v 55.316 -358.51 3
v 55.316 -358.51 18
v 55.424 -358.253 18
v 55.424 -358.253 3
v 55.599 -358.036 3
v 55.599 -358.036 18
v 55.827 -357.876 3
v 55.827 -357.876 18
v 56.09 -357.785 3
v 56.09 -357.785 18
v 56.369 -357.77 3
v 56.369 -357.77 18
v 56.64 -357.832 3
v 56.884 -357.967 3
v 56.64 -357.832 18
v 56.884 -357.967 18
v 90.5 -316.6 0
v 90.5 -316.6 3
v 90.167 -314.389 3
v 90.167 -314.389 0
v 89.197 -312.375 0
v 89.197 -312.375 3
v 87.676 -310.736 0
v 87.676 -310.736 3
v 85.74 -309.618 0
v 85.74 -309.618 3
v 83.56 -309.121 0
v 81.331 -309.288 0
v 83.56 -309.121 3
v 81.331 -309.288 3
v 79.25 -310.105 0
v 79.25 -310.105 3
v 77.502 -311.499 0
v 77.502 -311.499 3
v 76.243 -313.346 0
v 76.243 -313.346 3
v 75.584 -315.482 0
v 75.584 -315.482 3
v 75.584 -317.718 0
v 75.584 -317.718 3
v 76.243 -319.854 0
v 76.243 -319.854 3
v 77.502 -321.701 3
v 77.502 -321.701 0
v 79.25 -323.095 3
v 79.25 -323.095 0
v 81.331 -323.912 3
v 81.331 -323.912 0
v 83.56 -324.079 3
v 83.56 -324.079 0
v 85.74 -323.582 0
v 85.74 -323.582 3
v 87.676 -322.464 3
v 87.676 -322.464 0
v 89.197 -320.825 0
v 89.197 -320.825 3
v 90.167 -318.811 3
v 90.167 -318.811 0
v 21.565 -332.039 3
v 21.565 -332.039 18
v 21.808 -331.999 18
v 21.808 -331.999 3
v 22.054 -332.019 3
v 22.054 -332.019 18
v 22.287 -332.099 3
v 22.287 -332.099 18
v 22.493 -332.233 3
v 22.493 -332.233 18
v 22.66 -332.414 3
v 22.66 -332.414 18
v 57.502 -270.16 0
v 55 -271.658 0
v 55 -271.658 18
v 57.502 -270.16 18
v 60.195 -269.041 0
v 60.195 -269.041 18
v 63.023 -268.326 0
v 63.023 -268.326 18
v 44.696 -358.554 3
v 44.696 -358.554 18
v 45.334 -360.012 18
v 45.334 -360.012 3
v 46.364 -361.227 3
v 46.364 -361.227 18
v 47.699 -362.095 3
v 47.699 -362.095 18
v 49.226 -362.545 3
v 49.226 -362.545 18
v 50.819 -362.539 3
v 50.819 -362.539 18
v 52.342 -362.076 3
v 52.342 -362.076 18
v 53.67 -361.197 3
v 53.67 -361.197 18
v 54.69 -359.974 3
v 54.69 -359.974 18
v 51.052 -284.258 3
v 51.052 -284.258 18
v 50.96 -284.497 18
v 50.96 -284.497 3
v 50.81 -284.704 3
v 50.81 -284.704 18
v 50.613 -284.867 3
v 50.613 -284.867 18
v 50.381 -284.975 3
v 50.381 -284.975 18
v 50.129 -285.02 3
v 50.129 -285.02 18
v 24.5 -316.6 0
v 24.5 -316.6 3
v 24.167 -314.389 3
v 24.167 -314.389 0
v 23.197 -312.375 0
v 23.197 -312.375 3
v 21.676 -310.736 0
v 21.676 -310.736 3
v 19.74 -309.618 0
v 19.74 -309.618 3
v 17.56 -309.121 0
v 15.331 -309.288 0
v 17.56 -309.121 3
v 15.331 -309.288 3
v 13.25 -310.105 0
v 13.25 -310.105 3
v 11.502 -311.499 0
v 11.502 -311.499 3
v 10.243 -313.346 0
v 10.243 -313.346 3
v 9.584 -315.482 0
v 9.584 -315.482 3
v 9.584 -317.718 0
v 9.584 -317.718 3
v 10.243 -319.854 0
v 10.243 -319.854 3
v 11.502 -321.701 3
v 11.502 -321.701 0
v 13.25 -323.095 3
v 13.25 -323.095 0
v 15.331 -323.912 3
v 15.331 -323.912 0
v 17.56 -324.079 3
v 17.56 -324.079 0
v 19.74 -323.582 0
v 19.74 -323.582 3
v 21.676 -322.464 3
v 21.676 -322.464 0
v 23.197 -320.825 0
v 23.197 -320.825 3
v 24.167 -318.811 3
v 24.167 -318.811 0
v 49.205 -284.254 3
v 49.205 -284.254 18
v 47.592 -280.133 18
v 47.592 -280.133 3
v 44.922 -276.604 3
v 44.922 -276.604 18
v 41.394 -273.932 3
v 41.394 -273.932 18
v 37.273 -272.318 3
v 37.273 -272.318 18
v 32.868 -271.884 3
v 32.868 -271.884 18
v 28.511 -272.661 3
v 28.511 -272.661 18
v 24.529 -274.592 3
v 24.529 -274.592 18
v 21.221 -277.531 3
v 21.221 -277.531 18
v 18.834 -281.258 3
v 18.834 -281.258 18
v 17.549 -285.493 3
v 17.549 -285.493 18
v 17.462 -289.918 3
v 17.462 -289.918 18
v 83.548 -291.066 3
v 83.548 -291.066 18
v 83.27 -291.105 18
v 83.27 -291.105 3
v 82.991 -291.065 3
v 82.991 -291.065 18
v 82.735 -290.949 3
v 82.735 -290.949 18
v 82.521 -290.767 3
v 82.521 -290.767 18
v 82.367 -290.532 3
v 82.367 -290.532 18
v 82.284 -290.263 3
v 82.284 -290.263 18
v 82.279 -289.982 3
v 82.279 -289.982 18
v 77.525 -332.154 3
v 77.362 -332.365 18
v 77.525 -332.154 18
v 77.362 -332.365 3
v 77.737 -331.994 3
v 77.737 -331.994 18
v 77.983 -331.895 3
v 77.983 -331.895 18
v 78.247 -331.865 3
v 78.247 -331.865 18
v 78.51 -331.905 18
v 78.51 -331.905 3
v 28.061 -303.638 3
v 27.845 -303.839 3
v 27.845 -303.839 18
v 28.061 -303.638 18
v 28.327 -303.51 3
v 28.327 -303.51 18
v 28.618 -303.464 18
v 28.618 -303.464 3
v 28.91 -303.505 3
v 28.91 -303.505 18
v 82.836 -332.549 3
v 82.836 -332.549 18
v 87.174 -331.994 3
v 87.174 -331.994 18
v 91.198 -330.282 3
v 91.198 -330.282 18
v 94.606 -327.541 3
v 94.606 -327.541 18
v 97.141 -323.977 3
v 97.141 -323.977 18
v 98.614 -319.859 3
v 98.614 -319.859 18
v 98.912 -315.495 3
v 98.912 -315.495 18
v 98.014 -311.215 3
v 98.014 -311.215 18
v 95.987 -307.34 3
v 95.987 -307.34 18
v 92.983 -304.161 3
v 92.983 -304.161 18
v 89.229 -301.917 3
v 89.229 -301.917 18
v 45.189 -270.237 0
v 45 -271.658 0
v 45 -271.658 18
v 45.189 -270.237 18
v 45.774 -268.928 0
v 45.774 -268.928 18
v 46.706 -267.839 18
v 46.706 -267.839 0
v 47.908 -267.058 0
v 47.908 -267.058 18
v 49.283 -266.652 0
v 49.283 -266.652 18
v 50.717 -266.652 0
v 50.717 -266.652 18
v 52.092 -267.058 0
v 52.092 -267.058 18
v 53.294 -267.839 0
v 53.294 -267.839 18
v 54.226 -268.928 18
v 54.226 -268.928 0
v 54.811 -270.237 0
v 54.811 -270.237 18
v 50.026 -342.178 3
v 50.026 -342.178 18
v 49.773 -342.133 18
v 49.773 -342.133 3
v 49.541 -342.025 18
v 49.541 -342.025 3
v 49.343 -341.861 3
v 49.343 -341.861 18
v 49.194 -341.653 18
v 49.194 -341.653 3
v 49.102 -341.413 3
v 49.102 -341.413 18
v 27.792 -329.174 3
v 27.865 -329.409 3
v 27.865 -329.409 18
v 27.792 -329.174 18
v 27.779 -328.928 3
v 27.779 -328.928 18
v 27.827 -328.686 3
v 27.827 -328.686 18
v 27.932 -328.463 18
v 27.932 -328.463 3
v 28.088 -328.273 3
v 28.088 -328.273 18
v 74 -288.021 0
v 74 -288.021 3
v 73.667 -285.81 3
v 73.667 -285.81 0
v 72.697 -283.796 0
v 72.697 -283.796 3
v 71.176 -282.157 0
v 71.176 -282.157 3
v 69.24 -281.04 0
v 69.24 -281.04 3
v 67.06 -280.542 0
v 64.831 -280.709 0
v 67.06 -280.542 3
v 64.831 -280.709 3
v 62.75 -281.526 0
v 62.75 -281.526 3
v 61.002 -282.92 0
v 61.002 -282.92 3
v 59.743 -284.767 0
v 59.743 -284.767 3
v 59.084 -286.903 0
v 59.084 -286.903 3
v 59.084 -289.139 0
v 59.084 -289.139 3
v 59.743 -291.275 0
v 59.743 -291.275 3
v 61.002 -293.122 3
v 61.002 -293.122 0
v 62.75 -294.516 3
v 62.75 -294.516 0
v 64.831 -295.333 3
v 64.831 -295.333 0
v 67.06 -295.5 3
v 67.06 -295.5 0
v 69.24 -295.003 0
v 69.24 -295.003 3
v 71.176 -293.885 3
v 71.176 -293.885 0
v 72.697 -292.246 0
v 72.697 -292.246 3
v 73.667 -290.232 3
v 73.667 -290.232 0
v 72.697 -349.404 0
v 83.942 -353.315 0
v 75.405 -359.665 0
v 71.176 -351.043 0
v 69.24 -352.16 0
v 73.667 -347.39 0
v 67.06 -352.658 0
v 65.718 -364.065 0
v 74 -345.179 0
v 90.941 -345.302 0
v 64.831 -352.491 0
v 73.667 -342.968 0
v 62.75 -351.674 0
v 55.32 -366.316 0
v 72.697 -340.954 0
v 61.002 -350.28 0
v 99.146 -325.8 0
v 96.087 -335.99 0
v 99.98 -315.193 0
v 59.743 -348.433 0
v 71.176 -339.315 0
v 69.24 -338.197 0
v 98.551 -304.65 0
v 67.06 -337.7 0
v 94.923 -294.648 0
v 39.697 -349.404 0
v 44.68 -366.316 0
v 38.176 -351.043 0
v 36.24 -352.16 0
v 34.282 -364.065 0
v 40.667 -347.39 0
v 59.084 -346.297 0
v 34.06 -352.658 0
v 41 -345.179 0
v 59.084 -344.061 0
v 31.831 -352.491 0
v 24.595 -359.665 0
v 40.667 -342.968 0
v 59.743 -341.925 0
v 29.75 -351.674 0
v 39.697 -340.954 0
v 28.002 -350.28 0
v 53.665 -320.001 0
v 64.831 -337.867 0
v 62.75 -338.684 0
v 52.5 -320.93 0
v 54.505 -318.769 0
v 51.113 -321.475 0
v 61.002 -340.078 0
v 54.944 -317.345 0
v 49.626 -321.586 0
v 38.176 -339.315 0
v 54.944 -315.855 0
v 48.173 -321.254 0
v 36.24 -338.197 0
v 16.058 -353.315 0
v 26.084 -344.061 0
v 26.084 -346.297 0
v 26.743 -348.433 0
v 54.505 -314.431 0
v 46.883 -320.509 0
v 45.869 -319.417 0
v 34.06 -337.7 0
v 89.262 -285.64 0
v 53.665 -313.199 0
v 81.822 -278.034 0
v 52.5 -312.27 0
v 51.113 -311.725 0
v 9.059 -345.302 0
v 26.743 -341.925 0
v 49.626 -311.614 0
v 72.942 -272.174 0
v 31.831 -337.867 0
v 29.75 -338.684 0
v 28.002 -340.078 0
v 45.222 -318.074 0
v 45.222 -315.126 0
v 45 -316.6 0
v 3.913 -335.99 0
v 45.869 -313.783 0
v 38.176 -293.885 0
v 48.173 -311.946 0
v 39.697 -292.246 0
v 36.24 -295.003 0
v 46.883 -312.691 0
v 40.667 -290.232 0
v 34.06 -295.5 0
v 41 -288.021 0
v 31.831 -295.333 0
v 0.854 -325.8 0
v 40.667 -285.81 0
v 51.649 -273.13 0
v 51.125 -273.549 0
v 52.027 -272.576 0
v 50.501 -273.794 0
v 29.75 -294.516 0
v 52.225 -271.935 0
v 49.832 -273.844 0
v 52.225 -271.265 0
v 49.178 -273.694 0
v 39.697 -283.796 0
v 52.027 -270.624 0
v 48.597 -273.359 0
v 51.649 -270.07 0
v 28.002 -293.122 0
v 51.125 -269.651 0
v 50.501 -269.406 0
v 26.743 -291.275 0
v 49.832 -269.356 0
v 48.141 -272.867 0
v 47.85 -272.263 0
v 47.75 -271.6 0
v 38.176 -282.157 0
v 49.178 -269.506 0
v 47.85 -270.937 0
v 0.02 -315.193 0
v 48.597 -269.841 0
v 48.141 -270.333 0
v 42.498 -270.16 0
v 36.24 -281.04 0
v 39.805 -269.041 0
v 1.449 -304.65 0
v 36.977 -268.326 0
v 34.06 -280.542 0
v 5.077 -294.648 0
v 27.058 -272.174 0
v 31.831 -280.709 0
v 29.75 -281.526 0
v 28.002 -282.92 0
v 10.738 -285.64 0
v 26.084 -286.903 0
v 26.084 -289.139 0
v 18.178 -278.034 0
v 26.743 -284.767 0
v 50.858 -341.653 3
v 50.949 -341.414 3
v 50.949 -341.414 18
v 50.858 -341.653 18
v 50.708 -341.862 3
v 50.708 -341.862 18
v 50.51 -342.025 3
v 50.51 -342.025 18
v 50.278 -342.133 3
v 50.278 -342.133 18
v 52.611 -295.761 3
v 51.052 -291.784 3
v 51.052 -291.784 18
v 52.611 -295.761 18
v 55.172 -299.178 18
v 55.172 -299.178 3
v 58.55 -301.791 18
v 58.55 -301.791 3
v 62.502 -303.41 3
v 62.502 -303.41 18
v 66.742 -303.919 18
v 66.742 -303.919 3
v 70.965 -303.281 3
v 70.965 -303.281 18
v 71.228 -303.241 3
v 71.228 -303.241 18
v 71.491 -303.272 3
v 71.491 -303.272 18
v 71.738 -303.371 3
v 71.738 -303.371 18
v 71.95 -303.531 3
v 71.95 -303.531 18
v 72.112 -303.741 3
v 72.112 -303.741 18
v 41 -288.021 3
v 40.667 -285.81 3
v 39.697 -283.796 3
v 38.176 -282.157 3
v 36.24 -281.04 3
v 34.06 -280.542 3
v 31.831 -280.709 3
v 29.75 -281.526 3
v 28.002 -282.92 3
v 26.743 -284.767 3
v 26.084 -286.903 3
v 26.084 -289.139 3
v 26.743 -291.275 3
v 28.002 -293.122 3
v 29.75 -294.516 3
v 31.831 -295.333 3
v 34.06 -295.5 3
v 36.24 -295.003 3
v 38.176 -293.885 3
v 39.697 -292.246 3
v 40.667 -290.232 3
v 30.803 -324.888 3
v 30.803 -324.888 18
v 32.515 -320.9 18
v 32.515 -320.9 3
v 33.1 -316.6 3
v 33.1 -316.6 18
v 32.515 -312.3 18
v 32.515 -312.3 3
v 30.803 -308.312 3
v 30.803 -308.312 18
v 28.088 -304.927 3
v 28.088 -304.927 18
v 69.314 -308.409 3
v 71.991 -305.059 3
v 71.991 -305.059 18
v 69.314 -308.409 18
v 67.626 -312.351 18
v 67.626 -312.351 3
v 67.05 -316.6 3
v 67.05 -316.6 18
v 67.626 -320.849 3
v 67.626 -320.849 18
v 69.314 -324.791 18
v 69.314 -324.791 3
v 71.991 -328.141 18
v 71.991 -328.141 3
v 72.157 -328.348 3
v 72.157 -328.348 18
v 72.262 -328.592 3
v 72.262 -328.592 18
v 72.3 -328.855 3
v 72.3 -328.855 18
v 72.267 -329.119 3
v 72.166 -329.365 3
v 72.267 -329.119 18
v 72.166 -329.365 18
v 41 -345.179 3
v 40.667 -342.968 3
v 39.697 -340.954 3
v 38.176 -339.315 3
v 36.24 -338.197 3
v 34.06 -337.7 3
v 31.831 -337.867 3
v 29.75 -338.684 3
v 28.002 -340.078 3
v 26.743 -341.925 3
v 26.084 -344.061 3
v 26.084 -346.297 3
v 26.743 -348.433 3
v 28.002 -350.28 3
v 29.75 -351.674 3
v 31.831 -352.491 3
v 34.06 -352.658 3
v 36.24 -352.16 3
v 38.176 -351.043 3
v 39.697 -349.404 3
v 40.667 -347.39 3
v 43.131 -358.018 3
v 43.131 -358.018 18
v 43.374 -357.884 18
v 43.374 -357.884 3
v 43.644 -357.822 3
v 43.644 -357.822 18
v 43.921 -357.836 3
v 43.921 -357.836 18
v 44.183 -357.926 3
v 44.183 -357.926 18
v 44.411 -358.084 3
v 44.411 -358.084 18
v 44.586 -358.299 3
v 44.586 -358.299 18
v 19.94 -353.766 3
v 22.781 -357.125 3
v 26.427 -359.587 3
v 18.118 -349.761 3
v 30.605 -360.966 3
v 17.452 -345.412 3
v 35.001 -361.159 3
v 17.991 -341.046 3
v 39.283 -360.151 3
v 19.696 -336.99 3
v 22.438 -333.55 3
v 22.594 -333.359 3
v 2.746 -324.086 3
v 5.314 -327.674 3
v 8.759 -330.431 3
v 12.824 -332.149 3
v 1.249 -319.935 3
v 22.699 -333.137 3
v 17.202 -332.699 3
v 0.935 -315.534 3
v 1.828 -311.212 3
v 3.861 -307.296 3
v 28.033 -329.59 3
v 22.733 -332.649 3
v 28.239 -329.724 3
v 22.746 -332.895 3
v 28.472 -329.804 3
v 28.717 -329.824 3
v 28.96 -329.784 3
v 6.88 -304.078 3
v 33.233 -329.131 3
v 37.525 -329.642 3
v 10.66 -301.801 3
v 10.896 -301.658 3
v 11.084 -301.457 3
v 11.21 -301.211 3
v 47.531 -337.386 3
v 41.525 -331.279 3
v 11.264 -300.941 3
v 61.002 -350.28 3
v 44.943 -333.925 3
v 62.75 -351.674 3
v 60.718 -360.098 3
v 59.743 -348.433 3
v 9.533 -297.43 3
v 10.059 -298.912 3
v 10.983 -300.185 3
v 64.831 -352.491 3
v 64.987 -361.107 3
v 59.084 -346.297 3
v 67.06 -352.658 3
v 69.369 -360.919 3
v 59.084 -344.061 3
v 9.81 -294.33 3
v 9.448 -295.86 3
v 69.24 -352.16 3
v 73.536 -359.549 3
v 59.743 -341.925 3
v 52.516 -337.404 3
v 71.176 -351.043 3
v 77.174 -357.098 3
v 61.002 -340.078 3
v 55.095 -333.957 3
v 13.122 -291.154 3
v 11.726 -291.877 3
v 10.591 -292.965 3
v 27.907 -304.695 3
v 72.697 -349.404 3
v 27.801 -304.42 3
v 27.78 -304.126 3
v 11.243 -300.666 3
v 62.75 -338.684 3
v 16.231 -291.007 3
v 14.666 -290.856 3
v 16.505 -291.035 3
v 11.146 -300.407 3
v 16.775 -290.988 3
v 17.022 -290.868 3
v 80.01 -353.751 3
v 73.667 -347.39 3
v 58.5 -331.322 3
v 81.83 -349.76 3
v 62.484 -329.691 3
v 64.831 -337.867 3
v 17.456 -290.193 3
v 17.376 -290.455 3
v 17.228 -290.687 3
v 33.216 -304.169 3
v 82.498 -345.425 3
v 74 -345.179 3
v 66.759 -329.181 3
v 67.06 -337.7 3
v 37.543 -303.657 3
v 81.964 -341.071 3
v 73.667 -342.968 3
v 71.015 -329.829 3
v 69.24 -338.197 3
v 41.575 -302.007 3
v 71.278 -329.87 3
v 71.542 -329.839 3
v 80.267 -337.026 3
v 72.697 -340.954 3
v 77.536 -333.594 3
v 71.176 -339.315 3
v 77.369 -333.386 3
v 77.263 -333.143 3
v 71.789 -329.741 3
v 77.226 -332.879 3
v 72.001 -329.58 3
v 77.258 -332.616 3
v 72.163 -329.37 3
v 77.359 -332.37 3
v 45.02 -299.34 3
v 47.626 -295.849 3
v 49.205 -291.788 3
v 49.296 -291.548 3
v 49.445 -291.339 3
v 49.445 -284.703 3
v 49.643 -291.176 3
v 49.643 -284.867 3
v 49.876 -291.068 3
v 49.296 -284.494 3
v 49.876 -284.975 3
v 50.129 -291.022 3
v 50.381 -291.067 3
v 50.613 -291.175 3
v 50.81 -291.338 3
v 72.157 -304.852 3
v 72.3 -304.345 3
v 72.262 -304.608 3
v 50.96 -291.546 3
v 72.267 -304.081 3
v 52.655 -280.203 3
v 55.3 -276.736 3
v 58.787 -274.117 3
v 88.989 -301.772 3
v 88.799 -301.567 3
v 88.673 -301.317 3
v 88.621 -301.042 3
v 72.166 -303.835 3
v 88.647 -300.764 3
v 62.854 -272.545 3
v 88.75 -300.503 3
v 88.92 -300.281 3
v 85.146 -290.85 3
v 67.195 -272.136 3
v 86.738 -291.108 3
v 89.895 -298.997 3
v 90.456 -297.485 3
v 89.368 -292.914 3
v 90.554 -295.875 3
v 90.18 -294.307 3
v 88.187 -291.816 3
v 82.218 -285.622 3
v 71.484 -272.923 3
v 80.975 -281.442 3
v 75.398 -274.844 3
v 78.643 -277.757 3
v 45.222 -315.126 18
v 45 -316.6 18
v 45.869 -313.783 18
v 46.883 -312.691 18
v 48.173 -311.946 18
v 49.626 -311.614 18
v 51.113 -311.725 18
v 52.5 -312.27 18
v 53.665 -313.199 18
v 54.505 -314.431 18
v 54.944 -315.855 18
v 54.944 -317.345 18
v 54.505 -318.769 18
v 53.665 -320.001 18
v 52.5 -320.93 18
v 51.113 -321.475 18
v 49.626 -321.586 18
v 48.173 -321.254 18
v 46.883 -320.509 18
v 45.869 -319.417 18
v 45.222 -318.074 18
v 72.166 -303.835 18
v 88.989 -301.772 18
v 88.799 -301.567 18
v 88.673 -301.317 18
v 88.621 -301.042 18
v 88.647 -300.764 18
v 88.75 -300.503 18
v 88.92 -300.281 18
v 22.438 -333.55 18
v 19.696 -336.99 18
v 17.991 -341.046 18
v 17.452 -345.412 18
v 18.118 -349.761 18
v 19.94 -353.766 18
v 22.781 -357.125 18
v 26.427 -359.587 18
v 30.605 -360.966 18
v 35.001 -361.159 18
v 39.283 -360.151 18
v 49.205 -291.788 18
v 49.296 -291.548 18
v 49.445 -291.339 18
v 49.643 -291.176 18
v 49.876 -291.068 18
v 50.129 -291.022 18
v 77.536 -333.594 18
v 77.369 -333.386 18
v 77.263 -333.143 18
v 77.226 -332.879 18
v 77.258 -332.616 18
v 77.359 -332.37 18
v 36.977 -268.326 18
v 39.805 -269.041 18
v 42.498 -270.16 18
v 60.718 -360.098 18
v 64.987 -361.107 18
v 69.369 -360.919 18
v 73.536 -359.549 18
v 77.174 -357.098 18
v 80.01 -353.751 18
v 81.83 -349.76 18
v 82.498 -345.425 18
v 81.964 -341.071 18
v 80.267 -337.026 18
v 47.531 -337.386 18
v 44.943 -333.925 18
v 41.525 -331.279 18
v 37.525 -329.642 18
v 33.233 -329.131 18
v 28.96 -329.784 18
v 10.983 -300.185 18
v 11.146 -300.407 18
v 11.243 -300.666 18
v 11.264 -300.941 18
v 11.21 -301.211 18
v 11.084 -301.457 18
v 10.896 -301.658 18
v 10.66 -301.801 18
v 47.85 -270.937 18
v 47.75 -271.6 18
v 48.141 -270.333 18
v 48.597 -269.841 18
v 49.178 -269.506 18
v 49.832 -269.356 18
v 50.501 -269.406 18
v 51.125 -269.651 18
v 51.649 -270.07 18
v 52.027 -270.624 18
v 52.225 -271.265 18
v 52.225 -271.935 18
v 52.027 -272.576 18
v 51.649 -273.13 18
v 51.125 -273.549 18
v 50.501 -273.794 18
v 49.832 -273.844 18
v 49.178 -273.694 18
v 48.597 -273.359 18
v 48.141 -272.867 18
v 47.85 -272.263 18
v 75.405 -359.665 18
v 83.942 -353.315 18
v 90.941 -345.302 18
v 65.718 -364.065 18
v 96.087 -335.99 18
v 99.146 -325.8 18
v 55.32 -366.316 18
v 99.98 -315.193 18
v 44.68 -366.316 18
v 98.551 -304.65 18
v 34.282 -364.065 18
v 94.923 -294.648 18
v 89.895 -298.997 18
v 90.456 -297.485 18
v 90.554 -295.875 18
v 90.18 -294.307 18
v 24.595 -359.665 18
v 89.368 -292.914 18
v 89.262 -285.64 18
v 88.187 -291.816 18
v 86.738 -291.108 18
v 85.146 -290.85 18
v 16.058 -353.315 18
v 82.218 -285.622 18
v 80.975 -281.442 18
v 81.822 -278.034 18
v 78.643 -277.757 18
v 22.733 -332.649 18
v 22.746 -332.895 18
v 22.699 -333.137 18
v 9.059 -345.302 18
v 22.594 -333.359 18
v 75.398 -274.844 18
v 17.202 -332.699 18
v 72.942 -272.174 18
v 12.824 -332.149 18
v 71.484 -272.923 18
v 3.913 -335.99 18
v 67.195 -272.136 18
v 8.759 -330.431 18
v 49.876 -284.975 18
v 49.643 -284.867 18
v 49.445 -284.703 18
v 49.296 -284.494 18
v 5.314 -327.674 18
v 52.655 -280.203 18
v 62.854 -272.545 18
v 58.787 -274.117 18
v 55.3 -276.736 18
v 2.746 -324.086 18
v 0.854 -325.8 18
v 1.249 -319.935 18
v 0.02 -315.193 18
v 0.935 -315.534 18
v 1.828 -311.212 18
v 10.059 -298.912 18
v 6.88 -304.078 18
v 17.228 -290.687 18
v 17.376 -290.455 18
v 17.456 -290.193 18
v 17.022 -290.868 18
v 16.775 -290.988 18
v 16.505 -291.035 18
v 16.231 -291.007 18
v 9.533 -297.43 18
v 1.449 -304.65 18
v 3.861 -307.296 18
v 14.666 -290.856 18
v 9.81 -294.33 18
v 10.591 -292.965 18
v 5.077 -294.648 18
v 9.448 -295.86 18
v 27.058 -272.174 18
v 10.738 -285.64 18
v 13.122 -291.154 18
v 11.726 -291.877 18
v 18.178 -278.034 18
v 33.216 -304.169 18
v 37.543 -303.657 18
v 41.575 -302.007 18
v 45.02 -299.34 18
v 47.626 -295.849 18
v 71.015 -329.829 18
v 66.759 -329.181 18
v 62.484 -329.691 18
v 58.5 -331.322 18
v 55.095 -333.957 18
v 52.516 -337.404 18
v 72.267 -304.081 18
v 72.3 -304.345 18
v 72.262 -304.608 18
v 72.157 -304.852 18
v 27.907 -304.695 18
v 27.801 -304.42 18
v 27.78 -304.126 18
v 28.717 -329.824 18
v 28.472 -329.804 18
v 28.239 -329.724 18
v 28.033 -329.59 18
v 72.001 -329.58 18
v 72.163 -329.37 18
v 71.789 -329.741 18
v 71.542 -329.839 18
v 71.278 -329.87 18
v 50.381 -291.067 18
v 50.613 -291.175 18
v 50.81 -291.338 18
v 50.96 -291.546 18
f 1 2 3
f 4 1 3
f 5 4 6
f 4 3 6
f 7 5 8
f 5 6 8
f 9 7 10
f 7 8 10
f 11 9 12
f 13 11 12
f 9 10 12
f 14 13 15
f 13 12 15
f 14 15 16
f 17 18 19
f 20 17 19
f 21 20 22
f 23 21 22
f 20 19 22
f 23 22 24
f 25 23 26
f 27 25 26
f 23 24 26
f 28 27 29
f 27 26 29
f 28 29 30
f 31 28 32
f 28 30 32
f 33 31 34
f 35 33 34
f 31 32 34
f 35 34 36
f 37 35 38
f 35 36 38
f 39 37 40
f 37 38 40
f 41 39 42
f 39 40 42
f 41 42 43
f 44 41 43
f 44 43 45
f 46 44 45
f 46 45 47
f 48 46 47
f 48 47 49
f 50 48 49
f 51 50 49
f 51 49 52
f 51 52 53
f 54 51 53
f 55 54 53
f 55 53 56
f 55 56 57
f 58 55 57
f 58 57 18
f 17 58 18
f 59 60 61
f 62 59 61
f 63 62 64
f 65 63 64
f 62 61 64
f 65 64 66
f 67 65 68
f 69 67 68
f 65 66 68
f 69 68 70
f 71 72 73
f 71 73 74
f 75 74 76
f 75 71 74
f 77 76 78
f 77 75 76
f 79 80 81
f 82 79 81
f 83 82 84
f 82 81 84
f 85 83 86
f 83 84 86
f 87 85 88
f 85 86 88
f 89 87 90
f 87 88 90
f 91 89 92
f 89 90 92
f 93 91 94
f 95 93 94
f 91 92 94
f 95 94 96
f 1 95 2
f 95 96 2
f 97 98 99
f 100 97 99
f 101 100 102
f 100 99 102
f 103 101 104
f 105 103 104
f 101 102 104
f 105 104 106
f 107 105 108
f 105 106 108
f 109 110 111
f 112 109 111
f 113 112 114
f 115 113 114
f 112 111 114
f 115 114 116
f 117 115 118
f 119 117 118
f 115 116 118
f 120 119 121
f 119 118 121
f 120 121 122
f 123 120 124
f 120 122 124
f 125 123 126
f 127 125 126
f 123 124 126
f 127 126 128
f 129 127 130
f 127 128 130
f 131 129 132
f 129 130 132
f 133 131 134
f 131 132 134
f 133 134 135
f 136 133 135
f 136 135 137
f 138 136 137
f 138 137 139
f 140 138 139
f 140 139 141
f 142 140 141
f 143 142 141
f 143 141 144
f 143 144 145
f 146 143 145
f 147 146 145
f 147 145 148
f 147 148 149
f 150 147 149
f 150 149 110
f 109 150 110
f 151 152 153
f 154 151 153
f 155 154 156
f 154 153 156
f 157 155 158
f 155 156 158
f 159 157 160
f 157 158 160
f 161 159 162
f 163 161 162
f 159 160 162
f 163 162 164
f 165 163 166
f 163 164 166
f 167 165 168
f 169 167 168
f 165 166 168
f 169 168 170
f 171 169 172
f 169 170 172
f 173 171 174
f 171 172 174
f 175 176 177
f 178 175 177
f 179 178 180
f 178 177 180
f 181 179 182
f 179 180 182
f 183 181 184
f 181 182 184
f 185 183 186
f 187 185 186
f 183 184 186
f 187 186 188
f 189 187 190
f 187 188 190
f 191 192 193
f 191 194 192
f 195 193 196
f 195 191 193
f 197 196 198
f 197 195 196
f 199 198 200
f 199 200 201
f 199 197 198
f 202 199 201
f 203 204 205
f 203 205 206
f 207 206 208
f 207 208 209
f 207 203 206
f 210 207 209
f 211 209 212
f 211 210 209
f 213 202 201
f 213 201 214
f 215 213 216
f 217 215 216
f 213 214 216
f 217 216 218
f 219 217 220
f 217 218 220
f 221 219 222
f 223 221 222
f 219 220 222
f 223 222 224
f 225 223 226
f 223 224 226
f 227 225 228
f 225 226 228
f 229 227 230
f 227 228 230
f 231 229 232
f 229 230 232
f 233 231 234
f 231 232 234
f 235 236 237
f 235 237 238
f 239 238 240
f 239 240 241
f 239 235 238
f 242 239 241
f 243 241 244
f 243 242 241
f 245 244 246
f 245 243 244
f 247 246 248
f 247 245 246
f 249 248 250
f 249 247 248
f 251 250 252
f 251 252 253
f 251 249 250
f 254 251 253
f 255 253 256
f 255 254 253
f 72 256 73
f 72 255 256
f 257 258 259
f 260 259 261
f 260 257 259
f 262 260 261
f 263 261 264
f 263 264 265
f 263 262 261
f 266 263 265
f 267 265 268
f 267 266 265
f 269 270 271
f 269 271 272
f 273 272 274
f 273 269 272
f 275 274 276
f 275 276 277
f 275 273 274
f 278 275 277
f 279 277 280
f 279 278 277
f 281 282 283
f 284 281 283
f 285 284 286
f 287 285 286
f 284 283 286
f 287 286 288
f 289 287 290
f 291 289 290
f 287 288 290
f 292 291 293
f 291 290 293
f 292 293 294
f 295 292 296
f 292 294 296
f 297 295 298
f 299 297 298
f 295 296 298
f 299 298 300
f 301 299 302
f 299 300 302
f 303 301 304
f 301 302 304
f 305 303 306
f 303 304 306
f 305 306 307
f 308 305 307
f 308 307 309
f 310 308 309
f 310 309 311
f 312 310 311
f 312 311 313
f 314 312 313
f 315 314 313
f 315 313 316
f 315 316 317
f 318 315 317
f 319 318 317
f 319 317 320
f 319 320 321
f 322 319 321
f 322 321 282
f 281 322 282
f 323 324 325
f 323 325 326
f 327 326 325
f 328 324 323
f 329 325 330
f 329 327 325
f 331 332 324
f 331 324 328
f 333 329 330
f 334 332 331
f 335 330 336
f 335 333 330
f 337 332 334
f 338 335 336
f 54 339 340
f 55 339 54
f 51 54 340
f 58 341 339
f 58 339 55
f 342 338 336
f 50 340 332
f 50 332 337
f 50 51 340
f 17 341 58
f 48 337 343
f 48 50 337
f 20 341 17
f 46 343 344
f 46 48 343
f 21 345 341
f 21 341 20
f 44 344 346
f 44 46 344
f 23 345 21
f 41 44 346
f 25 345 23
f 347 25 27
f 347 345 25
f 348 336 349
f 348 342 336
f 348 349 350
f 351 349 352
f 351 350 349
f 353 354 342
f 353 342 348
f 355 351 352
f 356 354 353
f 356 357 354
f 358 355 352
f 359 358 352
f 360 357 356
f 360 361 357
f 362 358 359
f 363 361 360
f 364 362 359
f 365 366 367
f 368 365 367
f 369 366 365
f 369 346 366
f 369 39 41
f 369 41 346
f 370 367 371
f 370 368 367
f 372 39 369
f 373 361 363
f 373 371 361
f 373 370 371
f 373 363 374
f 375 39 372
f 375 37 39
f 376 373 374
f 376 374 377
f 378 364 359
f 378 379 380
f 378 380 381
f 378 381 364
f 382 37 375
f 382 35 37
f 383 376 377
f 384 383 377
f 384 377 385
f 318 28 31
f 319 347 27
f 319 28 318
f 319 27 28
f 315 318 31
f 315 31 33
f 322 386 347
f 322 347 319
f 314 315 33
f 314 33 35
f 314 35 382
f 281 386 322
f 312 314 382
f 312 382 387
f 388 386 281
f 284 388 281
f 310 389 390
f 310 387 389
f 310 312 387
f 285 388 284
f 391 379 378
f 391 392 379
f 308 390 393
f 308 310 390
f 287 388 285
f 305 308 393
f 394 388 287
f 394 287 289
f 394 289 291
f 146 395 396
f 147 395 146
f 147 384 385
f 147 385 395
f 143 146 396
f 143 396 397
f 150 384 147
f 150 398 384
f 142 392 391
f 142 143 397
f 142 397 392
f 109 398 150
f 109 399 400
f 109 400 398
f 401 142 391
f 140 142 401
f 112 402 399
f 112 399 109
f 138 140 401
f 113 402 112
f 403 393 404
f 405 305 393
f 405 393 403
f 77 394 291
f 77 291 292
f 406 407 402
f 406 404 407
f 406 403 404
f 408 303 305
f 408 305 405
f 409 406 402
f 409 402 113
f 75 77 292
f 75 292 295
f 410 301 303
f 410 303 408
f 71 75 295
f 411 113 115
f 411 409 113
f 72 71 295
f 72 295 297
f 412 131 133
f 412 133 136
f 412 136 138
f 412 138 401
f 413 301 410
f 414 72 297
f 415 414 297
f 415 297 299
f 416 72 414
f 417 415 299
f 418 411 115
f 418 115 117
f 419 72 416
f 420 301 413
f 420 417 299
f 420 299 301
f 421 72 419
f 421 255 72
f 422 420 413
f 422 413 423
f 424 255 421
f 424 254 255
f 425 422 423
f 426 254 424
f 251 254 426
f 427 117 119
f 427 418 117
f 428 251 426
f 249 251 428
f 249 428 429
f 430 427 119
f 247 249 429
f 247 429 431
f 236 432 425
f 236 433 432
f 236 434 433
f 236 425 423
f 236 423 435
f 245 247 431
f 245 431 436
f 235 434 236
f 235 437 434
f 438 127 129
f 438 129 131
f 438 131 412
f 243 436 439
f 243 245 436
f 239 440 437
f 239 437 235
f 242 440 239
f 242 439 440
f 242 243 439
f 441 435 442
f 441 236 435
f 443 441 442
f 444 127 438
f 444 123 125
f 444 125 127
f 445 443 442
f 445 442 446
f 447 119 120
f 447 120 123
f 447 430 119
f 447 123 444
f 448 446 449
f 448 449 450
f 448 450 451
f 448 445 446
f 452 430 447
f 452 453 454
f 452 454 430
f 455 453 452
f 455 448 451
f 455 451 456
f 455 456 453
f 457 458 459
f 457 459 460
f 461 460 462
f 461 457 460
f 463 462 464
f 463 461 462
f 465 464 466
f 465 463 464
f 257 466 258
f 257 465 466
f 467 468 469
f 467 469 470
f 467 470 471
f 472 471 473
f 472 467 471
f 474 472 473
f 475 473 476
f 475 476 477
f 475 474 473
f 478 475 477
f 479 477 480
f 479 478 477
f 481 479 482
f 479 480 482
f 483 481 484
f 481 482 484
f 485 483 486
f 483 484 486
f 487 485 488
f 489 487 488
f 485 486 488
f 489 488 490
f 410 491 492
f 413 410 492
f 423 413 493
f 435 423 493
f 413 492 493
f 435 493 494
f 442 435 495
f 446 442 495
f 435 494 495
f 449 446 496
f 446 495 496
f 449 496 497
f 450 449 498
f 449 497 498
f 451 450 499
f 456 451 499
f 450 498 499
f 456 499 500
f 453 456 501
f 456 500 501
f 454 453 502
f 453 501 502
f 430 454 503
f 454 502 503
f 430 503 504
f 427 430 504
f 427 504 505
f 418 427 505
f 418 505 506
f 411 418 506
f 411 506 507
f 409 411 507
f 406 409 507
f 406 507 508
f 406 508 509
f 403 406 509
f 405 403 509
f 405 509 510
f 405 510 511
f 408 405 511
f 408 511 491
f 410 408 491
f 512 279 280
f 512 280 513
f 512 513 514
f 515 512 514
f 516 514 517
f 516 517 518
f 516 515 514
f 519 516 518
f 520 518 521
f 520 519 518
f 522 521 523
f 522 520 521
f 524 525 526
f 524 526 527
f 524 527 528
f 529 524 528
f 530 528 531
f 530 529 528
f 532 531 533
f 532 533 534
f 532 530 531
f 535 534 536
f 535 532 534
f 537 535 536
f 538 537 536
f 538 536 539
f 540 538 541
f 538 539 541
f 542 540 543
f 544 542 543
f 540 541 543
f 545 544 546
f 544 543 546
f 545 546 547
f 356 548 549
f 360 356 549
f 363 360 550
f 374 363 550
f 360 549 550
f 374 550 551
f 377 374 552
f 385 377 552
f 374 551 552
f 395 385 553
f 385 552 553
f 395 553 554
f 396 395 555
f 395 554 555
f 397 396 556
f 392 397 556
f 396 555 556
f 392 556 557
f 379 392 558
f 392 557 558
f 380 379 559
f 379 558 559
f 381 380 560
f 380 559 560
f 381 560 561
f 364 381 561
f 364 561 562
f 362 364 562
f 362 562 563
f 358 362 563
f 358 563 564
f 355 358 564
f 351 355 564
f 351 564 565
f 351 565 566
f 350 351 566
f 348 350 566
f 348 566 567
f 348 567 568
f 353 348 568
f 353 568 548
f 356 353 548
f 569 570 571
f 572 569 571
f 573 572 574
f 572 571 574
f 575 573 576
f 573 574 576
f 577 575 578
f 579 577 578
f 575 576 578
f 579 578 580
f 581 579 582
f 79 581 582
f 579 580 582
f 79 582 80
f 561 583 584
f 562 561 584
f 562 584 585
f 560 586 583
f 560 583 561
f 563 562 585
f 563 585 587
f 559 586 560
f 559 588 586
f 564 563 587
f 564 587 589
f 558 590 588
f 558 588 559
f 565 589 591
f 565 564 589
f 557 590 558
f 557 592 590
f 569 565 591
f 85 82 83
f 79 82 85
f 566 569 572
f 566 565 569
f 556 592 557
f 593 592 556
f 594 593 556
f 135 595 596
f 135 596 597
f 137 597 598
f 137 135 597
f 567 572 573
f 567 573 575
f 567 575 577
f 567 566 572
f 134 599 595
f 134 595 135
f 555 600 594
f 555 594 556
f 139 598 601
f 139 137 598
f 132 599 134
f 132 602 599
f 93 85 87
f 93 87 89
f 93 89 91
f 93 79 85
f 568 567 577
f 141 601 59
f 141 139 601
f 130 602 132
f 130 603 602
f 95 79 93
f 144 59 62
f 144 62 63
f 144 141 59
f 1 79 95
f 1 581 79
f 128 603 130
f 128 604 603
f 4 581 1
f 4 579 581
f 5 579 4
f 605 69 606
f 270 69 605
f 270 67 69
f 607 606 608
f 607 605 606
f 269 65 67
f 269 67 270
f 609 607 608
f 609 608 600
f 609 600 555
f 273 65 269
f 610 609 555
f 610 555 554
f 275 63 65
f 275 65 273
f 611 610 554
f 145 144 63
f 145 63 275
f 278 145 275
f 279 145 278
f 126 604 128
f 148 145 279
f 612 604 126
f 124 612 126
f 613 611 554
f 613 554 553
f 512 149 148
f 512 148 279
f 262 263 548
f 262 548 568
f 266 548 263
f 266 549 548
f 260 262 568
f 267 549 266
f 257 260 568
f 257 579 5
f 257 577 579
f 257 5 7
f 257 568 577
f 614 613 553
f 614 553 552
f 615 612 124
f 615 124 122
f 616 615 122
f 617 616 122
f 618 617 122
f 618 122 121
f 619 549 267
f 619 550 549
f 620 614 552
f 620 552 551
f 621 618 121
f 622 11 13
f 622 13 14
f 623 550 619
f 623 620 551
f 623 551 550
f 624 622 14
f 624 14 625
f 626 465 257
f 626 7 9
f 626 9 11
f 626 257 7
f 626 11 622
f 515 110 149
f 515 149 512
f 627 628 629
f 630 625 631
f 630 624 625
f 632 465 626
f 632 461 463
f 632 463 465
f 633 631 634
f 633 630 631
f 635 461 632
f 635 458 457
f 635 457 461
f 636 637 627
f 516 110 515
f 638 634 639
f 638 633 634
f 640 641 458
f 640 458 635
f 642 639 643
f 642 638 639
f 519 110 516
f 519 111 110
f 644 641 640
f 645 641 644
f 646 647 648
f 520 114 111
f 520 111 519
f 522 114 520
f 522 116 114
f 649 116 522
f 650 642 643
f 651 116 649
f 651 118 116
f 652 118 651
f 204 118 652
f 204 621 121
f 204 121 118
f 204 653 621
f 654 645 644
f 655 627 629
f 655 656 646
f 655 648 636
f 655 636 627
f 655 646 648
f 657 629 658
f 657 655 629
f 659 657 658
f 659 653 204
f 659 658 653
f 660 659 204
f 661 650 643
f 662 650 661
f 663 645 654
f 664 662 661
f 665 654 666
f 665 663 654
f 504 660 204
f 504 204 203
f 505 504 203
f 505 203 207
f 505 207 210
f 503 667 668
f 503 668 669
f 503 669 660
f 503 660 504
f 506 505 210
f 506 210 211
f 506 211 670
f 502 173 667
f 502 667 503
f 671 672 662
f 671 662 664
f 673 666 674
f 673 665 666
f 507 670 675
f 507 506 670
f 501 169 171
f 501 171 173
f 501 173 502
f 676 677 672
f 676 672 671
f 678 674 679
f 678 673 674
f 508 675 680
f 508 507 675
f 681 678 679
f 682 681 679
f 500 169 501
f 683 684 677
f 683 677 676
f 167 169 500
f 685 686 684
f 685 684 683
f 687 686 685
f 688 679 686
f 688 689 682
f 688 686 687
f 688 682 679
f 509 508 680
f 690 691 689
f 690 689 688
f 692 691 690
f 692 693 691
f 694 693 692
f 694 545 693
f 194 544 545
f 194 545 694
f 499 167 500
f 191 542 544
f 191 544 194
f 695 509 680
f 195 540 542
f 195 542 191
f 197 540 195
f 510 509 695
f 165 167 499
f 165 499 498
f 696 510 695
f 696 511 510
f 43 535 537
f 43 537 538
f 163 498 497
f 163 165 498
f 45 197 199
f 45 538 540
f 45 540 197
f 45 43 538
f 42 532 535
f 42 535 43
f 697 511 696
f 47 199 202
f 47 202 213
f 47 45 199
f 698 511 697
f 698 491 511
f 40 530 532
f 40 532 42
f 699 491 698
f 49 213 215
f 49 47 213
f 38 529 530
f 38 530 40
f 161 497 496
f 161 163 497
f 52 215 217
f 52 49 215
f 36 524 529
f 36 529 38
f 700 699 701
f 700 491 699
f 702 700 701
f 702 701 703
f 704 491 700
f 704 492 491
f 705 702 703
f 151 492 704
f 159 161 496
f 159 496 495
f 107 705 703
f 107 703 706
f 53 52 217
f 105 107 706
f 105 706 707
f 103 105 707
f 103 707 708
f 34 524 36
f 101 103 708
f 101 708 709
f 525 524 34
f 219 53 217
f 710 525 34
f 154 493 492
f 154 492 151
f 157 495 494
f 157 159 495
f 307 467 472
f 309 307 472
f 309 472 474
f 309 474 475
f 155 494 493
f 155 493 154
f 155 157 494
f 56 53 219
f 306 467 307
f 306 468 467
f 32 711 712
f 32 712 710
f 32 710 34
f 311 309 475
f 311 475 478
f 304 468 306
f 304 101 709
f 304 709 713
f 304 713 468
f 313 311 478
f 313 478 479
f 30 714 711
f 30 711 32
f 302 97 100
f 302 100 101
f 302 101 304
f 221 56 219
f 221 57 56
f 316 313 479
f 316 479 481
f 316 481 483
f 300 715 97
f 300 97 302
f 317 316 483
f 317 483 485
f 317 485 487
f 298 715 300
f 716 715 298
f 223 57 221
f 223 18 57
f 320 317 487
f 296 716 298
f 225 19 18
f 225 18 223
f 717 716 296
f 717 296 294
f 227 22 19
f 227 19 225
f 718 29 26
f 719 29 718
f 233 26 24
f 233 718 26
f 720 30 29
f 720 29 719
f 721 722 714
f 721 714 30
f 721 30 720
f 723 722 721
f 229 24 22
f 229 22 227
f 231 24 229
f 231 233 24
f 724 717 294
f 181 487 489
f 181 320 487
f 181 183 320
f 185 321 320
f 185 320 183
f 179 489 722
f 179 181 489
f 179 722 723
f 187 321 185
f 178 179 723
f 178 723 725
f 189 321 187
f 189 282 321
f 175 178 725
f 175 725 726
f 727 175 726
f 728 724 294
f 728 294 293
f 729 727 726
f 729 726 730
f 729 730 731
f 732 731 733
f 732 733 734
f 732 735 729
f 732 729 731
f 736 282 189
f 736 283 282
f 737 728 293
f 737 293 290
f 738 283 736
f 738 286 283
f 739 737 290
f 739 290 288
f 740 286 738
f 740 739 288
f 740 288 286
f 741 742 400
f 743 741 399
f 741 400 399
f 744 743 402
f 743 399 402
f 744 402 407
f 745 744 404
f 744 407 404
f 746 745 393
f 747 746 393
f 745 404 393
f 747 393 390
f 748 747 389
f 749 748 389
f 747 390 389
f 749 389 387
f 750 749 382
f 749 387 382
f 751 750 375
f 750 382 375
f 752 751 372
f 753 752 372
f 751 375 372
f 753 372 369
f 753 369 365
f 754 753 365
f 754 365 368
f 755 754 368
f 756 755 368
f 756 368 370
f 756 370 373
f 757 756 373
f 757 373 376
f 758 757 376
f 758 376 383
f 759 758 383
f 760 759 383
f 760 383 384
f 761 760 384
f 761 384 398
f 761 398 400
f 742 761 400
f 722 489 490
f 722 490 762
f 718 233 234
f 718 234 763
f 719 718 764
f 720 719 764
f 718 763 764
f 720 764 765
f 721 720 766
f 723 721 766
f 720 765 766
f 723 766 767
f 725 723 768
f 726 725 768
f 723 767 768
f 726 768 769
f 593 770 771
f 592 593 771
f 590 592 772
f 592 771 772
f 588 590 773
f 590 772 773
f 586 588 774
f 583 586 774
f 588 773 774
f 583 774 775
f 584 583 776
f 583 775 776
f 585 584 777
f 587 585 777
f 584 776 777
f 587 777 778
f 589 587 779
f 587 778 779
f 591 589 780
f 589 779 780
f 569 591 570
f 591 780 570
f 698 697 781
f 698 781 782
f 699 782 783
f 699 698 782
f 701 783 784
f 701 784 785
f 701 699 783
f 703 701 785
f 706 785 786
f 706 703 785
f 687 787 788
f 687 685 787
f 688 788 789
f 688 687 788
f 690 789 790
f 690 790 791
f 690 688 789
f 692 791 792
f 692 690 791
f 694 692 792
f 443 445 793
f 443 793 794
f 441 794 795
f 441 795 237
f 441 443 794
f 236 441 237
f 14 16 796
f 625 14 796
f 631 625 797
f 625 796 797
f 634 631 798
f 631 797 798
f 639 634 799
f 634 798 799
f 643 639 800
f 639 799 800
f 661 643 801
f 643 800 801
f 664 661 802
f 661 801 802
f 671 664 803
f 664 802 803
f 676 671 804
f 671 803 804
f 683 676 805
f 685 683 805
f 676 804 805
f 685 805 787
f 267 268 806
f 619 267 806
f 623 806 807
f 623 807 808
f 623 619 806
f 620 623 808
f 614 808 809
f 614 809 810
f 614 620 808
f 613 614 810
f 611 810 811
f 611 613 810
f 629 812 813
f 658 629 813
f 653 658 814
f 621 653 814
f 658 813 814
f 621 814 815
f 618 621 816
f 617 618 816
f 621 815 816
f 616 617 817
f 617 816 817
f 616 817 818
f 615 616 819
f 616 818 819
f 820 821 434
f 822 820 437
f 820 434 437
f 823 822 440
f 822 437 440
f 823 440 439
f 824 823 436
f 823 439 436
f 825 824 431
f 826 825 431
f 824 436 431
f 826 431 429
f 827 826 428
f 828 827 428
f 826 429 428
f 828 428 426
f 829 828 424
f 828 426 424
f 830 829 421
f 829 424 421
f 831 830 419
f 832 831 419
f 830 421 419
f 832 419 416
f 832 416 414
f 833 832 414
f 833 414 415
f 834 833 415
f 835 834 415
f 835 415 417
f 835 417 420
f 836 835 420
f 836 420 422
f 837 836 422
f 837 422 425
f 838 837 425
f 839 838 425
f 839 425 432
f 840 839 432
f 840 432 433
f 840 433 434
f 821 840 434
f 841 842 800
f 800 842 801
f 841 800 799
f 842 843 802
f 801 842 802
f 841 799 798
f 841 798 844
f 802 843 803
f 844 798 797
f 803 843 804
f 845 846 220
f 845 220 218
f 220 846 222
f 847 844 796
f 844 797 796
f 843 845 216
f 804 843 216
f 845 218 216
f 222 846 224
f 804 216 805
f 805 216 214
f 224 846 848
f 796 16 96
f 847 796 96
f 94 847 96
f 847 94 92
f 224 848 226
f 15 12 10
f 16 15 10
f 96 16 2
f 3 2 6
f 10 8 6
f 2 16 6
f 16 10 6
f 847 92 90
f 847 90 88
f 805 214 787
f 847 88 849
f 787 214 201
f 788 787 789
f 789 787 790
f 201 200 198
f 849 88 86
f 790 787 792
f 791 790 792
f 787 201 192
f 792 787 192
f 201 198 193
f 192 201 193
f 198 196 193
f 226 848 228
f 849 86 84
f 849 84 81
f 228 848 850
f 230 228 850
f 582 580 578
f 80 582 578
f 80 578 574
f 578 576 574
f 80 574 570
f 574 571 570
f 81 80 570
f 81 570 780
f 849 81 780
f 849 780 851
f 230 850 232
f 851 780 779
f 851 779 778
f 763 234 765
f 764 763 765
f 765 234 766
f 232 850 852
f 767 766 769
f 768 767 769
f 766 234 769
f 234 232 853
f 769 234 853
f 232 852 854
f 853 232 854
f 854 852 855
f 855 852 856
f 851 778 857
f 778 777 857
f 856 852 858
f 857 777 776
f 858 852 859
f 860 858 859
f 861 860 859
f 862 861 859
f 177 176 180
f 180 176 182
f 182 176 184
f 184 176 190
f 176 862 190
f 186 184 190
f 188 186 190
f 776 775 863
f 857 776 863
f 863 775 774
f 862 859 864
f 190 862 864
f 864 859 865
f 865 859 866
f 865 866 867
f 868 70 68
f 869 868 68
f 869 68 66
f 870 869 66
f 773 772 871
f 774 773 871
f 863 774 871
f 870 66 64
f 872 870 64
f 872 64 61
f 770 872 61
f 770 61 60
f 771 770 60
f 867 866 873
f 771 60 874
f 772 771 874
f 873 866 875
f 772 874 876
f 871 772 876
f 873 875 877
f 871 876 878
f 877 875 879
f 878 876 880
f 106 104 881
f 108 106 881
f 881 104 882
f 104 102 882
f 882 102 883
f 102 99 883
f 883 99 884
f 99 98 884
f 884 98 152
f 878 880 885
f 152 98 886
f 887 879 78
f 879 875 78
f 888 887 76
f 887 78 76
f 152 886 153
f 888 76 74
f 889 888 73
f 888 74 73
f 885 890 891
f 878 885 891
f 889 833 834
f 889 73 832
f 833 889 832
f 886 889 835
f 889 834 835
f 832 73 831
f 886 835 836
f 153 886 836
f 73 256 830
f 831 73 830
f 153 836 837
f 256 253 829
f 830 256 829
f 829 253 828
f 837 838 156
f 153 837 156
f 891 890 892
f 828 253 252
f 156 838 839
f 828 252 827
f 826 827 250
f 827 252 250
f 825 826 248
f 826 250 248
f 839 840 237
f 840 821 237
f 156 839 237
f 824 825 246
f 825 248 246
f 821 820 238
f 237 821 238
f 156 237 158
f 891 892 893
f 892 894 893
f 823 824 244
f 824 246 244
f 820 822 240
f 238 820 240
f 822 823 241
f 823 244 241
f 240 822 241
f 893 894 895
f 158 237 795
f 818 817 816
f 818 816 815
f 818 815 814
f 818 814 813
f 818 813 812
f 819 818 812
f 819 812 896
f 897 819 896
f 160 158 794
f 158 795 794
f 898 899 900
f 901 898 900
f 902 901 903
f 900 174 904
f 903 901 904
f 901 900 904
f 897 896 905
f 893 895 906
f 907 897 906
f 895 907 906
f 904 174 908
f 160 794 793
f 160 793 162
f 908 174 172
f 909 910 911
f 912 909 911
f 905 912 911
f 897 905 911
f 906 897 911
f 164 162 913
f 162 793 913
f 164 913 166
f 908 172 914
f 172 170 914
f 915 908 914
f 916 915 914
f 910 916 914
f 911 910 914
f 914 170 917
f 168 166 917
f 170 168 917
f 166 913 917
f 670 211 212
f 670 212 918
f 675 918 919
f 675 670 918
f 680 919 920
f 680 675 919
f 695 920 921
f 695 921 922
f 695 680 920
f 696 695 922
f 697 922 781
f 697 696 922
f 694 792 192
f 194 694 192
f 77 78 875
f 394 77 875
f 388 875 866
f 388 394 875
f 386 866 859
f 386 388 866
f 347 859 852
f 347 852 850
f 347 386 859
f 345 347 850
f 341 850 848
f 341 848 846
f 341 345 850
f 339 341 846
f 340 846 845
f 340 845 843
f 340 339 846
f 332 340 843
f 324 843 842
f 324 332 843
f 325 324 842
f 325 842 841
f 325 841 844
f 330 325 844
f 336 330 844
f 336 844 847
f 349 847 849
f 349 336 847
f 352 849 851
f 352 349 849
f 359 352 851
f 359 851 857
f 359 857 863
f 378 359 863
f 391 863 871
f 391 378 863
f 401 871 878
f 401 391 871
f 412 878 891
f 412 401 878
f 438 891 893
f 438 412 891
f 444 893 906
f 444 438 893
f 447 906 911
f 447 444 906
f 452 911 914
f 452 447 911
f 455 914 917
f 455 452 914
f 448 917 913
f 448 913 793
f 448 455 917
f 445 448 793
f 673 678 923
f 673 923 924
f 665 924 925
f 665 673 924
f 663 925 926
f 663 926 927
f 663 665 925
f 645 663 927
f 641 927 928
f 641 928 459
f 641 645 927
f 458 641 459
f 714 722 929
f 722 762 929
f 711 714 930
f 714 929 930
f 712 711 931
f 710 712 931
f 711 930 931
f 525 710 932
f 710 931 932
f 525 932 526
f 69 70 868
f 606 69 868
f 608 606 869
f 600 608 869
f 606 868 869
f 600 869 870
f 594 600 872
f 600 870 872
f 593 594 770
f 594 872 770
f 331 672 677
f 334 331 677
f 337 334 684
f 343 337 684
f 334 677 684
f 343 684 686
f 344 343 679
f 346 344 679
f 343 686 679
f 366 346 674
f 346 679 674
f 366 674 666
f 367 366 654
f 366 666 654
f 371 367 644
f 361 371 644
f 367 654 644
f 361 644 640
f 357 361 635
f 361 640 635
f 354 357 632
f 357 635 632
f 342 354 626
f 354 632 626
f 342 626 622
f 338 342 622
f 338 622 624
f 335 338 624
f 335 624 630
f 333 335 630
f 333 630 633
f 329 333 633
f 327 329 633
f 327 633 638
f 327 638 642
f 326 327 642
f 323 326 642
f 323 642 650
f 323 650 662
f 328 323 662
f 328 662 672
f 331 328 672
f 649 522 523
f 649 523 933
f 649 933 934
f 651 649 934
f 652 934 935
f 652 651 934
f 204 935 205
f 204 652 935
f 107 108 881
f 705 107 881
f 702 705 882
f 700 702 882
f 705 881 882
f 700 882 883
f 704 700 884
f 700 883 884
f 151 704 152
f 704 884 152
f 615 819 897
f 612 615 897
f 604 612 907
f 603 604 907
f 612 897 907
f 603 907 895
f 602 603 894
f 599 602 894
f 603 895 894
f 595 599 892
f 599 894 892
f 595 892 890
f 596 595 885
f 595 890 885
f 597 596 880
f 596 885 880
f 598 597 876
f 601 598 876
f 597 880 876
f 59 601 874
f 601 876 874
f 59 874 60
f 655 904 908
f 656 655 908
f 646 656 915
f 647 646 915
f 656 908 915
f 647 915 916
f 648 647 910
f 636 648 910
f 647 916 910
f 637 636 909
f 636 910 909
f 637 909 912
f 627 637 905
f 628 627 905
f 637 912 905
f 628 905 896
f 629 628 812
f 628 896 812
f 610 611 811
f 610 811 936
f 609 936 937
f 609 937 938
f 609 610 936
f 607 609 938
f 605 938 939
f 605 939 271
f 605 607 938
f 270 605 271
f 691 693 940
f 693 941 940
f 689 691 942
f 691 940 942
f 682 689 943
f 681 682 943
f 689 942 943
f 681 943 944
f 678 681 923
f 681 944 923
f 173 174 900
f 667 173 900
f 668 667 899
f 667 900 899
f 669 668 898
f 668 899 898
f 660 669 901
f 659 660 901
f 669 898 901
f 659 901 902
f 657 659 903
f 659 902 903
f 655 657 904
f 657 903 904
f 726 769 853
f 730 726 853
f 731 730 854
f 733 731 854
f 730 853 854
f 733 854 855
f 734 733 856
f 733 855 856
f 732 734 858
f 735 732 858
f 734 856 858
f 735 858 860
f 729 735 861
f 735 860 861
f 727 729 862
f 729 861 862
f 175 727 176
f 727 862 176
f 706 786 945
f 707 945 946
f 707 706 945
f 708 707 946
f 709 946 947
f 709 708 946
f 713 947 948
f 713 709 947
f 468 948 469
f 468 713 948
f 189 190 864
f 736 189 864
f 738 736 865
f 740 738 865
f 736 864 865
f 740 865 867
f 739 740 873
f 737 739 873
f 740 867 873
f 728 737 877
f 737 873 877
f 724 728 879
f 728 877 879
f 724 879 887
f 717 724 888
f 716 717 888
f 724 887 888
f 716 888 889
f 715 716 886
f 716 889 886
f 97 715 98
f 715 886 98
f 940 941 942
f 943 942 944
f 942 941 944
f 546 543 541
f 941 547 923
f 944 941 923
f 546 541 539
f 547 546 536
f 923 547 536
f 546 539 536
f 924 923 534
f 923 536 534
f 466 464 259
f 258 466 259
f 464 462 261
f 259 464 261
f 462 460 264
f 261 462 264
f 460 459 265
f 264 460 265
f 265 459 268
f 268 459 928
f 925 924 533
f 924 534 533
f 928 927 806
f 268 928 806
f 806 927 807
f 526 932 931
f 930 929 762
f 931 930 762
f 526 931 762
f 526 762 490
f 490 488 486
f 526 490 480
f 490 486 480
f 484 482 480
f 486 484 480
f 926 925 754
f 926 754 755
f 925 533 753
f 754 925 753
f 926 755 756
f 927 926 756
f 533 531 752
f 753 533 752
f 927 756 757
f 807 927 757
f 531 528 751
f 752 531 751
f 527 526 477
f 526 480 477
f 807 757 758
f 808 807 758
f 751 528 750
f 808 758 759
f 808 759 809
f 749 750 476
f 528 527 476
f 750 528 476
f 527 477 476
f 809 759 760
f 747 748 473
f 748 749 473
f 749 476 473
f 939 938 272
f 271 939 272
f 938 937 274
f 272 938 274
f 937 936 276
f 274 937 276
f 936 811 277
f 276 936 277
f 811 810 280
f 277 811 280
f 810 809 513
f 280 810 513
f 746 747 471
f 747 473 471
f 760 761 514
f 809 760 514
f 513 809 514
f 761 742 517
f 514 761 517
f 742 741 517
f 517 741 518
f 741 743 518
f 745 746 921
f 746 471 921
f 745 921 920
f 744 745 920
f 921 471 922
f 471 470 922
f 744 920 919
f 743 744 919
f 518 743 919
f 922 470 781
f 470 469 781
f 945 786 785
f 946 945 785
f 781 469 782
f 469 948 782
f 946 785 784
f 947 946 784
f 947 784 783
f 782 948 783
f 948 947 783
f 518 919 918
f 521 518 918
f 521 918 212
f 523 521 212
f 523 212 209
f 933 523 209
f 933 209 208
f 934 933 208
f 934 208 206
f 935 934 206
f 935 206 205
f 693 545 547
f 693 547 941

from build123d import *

# Parameters (mm, degrees)
EXTRUDE_1_DEPTH             = 18
CUT_EXTRUDE_1_DEPTH         = 15
EXTRUDE_2_DEPTH             = 15
HOLE_WIZARD_4_5_4_5_1_D     = 4.5
HOLE_WIZARD_4_5_4_5_1_DEPTH = 18
HOLE_WIZARD_10_0_10_1_D     = 10
HOLE_WIZARD_10_0_10_1_DEPTH = 18
HOLE_WIZARD_15_0_15_1_D     = 15
HOLE_WIZARD_15_0_15_1_DEPTH = 18
FILLET_1_R                  = 1


with BuildPart() as part:
    # 草图1 → 凸台-拉伸1 (new body)
    with BuildSketch(Plane(origin=(0, 0, 0), x_dir=(-1, 0, 0), z_dir=(0, 0, -1))):
        with BuildLine():
            ThreePointArc((-63.022889612, -268.325738264), (-50, -366.6), (-36.977110388, -268.325738264))
            ThreePointArc((-36.977110388, -268.325738264), (-41.171867667, -269.55111981), (-45.000340281, -271.658332659))
            ThreePointArc((-45.000340281, -271.658332659), (-50, -266.6), (-54.999659719, -271.658332659))
            ThreePointArc((-54.999659719, -271.658332659), (-58.828132333, -269.55111981), (-63.022889612, -268.325738264))
        make_face()
    extrude(amount=-EXTRUDE_1_DEPTH)

    # 草图2 → 切除-拉伸1 (cut)
    with BuildSketch(Plane.XY.offset(18)):
        with BuildLine():
            Line((76.956193034, -333.068180736), (77.765412233, -331.666571969))
            ThreePointArc((77.765412233, -331.666571969), (97.88324923, -322.335101774), (89.229210711, -301.916695402))
            ThreePointArc((89.229210711, -301.916695402), (88.637121061, -301.181657), (88.92041407, -300.281325574))
            ThreePointArc((88.92041407, -300.281325574), (89.825644155, -293.580135017), (83.548411657, -291.065826255))
            ThreePointArc((83.548411657, -291.065826255), (82.62171892, -290.865593126), (82.278658267, -289.981759362))
            ThreePointArc((82.278658267, -289.981759362), (69.366720715, -272.381727147), (51.051780987, -284.257848066))
            ThreePointArc((51.051780987, -284.257848066), (50.716834815, -284.792322878), (50.128600006, -285.01998946))
            ThreePointArc((50.128600006, -285.01998946), (49.538997539, -284.791191751), (49.204585003, -284.254397827))
            ThreePointArc((49.204585003, -284.254397827), (30.663154881, -272.122268325), (17.461812053, -289.918271942))
            ThreePointArc((17.461812053, -289.918271942), (17.131459448, -290.784603767), (16.231387053, -291.007164675))
            ThreePointArc((16.231387053, -291.007164675), (10.151561622, -293.619612904), (10.9830551, -300.184502973))
            ThreePointArc((10.9830551, -300.184502973), (11.246762281, -301.077699779), (10.659953012, -301.80088502))
            ThreePointArc((10.659953012, -301.80088502), (1.85480976, -322.061978817), (21.565140626, -332.039219251))
            ThreePointArc((21.565140626, -332.039219251), (22.17257693, -332.052081262), (22.660452123, -332.414189106))
            ThreePointArc((22.660452123, -332.414189106), (22.73017699, -333.017409123), (22.438041219, -333.549755475))
            ThreePointArc((22.438041219, -333.549755475), (21.244961438, -355.543032932), (43.131077631, -358.018030031))
            ThreePointArc((43.131077631, -358.018030031), (44.05505938, -357.871893349), (44.695584039, -358.553675105))
            ThreePointArc((44.695584039, -358.553675105), (50.022786366, -362.599952798), (55.316278846, -358.509673449))
            ThreePointArc((55.316278846, -358.509673449), (55.955599054, -357.821048903), (56.883882353, -357.966734219))
            ThreePointArc((56.883882353, -357.966734219), (78.956360747, -355.220704534), (76.956193034, -333.068180736))
        make_face()
    extrude(amount=-CUT_EXTRUDE_1_DEPTH, mode=Mode.SUBTRACT)

    # 草图3 → 凸台-拉伸2 (add)
    with BuildSketch(Plane.XY.offset(3)):
        with BuildLine():
            Line((71.709131996, -303.043642956), (72.56925981, -304.533428031))
            ThreePointArc((72.56925981, -304.533428031), (67.05, -316.6), (72.56925981, -328.666571969))
            Line((72.56925981, -328.666571969), (71.760040611, -330.068180736))
            ThreePointArc((71.760040611, -330.068180736), (58.841180082, -331.130974521), (50.949212572, -341.414132443))
            ThreePointArc((50.949212572, -341.414132443), (50.614490777, -341.949534813), (50.02571996, -342.177664826))
            ThreePointArc((50.02571996, -342.177664826), (49.436675631, -341.949308595), (49.102060561, -341.41344243))
            ThreePointArc((49.102060561, -341.41344243), (41.525, -331.279130594), (28.959898219, -329.78435958))
            ThreePointArc((28.959898219, -329.78435958), (28.35280487, -329.771183403), (27.865263445, -329.409189888))
            ThreePointArc((27.865263445, -329.409189888), (27.79560645, -328.805623655), (28.088185773, -328.273137379))
            ThreePointArc((28.088185773, -328.273137379), (33.1, -316.6), (28.088185773, -304.926862621))
            ThreePointArc((28.088185773, -304.926862621), (27.800926844, -304.419745345), (27.845189576, -303.838602992))
            ThreePointArc((27.845189576, -303.838602992), (28.326676887, -303.509594278), (28.909820681, -303.505113168))
            ThreePointArc((28.909820681, -303.505113168), (41.575, -302.007471946), (49.204585003, -291.787925524))
            ThreePointArc((49.204585003, -291.787925524), (49.538997539, -291.251131599), (50.128600006, -291.02233389))
            ThreePointArc((50.128600006, -291.02233389), (50.716834815, -291.250000473), (51.051780987, -291.784475285))
            ThreePointArc((51.051780987, -291.784475285), (58.890667579, -301.982109354), (71.709131996, -303.043642956))
        make_face()
    extrude(amount=EXTRUDE_2_DEPTH)

    # Ø4.5 (4.5) 直径孔1
    with Locations(Plane.XY.offset(18)):
        with Locations((50, -271.6)):
            Hole(HOLE_WIZARD_4_5_4_5_1_D / 2, depth=HOLE_WIZARD_4_5_4_5_1_DEPTH)

    # Ø10.0 (10) 直径孔1
    with Locations(Plane.XY.offset(18)):
        with Locations((50, -316.6)):
            Hole(HOLE_WIZARD_10_0_10_1_D / 2, depth=HOLE_WIZARD_10_0_10_1_DEPTH)

    # Ø15.0 (15) 直径孔1
    with Locations(Plane(origin=(0, 0, 0), x_dir=(-1, 0, 0), z_dir=(0, 0, -1))):
        with Locations((-33.5, -288.021161675), (-83, -316.6), (-66.5, -345.178838325), (-33.5, -345.178838325), (-66.5, -288.021161675), (-17, -316.6)):
            Hole(HOLE_WIZARD_15_0_15_1_D / 2, depth=HOLE_WIZARD_15_0_15_1_DEPTH)

    # 圆角1
    fillet_1_edges = [part.edges().sort_by_distance(p)[0] for p in [
        (77.765412233, -331.666571969, 10.5),
        (76.956193034, -333.068180736, 10.5),
        (71.760040611, -330.068180736, 10.5),
        (72.56925981, -328.666571969, 10.5),
        (72.56925981, -304.533428031, 10.5),
        (71.709131996, -303.043642956, 10.5),
    ]]
    fillet(fillet_1_edges, radius=FILLET_1_R)


solid = part.part
